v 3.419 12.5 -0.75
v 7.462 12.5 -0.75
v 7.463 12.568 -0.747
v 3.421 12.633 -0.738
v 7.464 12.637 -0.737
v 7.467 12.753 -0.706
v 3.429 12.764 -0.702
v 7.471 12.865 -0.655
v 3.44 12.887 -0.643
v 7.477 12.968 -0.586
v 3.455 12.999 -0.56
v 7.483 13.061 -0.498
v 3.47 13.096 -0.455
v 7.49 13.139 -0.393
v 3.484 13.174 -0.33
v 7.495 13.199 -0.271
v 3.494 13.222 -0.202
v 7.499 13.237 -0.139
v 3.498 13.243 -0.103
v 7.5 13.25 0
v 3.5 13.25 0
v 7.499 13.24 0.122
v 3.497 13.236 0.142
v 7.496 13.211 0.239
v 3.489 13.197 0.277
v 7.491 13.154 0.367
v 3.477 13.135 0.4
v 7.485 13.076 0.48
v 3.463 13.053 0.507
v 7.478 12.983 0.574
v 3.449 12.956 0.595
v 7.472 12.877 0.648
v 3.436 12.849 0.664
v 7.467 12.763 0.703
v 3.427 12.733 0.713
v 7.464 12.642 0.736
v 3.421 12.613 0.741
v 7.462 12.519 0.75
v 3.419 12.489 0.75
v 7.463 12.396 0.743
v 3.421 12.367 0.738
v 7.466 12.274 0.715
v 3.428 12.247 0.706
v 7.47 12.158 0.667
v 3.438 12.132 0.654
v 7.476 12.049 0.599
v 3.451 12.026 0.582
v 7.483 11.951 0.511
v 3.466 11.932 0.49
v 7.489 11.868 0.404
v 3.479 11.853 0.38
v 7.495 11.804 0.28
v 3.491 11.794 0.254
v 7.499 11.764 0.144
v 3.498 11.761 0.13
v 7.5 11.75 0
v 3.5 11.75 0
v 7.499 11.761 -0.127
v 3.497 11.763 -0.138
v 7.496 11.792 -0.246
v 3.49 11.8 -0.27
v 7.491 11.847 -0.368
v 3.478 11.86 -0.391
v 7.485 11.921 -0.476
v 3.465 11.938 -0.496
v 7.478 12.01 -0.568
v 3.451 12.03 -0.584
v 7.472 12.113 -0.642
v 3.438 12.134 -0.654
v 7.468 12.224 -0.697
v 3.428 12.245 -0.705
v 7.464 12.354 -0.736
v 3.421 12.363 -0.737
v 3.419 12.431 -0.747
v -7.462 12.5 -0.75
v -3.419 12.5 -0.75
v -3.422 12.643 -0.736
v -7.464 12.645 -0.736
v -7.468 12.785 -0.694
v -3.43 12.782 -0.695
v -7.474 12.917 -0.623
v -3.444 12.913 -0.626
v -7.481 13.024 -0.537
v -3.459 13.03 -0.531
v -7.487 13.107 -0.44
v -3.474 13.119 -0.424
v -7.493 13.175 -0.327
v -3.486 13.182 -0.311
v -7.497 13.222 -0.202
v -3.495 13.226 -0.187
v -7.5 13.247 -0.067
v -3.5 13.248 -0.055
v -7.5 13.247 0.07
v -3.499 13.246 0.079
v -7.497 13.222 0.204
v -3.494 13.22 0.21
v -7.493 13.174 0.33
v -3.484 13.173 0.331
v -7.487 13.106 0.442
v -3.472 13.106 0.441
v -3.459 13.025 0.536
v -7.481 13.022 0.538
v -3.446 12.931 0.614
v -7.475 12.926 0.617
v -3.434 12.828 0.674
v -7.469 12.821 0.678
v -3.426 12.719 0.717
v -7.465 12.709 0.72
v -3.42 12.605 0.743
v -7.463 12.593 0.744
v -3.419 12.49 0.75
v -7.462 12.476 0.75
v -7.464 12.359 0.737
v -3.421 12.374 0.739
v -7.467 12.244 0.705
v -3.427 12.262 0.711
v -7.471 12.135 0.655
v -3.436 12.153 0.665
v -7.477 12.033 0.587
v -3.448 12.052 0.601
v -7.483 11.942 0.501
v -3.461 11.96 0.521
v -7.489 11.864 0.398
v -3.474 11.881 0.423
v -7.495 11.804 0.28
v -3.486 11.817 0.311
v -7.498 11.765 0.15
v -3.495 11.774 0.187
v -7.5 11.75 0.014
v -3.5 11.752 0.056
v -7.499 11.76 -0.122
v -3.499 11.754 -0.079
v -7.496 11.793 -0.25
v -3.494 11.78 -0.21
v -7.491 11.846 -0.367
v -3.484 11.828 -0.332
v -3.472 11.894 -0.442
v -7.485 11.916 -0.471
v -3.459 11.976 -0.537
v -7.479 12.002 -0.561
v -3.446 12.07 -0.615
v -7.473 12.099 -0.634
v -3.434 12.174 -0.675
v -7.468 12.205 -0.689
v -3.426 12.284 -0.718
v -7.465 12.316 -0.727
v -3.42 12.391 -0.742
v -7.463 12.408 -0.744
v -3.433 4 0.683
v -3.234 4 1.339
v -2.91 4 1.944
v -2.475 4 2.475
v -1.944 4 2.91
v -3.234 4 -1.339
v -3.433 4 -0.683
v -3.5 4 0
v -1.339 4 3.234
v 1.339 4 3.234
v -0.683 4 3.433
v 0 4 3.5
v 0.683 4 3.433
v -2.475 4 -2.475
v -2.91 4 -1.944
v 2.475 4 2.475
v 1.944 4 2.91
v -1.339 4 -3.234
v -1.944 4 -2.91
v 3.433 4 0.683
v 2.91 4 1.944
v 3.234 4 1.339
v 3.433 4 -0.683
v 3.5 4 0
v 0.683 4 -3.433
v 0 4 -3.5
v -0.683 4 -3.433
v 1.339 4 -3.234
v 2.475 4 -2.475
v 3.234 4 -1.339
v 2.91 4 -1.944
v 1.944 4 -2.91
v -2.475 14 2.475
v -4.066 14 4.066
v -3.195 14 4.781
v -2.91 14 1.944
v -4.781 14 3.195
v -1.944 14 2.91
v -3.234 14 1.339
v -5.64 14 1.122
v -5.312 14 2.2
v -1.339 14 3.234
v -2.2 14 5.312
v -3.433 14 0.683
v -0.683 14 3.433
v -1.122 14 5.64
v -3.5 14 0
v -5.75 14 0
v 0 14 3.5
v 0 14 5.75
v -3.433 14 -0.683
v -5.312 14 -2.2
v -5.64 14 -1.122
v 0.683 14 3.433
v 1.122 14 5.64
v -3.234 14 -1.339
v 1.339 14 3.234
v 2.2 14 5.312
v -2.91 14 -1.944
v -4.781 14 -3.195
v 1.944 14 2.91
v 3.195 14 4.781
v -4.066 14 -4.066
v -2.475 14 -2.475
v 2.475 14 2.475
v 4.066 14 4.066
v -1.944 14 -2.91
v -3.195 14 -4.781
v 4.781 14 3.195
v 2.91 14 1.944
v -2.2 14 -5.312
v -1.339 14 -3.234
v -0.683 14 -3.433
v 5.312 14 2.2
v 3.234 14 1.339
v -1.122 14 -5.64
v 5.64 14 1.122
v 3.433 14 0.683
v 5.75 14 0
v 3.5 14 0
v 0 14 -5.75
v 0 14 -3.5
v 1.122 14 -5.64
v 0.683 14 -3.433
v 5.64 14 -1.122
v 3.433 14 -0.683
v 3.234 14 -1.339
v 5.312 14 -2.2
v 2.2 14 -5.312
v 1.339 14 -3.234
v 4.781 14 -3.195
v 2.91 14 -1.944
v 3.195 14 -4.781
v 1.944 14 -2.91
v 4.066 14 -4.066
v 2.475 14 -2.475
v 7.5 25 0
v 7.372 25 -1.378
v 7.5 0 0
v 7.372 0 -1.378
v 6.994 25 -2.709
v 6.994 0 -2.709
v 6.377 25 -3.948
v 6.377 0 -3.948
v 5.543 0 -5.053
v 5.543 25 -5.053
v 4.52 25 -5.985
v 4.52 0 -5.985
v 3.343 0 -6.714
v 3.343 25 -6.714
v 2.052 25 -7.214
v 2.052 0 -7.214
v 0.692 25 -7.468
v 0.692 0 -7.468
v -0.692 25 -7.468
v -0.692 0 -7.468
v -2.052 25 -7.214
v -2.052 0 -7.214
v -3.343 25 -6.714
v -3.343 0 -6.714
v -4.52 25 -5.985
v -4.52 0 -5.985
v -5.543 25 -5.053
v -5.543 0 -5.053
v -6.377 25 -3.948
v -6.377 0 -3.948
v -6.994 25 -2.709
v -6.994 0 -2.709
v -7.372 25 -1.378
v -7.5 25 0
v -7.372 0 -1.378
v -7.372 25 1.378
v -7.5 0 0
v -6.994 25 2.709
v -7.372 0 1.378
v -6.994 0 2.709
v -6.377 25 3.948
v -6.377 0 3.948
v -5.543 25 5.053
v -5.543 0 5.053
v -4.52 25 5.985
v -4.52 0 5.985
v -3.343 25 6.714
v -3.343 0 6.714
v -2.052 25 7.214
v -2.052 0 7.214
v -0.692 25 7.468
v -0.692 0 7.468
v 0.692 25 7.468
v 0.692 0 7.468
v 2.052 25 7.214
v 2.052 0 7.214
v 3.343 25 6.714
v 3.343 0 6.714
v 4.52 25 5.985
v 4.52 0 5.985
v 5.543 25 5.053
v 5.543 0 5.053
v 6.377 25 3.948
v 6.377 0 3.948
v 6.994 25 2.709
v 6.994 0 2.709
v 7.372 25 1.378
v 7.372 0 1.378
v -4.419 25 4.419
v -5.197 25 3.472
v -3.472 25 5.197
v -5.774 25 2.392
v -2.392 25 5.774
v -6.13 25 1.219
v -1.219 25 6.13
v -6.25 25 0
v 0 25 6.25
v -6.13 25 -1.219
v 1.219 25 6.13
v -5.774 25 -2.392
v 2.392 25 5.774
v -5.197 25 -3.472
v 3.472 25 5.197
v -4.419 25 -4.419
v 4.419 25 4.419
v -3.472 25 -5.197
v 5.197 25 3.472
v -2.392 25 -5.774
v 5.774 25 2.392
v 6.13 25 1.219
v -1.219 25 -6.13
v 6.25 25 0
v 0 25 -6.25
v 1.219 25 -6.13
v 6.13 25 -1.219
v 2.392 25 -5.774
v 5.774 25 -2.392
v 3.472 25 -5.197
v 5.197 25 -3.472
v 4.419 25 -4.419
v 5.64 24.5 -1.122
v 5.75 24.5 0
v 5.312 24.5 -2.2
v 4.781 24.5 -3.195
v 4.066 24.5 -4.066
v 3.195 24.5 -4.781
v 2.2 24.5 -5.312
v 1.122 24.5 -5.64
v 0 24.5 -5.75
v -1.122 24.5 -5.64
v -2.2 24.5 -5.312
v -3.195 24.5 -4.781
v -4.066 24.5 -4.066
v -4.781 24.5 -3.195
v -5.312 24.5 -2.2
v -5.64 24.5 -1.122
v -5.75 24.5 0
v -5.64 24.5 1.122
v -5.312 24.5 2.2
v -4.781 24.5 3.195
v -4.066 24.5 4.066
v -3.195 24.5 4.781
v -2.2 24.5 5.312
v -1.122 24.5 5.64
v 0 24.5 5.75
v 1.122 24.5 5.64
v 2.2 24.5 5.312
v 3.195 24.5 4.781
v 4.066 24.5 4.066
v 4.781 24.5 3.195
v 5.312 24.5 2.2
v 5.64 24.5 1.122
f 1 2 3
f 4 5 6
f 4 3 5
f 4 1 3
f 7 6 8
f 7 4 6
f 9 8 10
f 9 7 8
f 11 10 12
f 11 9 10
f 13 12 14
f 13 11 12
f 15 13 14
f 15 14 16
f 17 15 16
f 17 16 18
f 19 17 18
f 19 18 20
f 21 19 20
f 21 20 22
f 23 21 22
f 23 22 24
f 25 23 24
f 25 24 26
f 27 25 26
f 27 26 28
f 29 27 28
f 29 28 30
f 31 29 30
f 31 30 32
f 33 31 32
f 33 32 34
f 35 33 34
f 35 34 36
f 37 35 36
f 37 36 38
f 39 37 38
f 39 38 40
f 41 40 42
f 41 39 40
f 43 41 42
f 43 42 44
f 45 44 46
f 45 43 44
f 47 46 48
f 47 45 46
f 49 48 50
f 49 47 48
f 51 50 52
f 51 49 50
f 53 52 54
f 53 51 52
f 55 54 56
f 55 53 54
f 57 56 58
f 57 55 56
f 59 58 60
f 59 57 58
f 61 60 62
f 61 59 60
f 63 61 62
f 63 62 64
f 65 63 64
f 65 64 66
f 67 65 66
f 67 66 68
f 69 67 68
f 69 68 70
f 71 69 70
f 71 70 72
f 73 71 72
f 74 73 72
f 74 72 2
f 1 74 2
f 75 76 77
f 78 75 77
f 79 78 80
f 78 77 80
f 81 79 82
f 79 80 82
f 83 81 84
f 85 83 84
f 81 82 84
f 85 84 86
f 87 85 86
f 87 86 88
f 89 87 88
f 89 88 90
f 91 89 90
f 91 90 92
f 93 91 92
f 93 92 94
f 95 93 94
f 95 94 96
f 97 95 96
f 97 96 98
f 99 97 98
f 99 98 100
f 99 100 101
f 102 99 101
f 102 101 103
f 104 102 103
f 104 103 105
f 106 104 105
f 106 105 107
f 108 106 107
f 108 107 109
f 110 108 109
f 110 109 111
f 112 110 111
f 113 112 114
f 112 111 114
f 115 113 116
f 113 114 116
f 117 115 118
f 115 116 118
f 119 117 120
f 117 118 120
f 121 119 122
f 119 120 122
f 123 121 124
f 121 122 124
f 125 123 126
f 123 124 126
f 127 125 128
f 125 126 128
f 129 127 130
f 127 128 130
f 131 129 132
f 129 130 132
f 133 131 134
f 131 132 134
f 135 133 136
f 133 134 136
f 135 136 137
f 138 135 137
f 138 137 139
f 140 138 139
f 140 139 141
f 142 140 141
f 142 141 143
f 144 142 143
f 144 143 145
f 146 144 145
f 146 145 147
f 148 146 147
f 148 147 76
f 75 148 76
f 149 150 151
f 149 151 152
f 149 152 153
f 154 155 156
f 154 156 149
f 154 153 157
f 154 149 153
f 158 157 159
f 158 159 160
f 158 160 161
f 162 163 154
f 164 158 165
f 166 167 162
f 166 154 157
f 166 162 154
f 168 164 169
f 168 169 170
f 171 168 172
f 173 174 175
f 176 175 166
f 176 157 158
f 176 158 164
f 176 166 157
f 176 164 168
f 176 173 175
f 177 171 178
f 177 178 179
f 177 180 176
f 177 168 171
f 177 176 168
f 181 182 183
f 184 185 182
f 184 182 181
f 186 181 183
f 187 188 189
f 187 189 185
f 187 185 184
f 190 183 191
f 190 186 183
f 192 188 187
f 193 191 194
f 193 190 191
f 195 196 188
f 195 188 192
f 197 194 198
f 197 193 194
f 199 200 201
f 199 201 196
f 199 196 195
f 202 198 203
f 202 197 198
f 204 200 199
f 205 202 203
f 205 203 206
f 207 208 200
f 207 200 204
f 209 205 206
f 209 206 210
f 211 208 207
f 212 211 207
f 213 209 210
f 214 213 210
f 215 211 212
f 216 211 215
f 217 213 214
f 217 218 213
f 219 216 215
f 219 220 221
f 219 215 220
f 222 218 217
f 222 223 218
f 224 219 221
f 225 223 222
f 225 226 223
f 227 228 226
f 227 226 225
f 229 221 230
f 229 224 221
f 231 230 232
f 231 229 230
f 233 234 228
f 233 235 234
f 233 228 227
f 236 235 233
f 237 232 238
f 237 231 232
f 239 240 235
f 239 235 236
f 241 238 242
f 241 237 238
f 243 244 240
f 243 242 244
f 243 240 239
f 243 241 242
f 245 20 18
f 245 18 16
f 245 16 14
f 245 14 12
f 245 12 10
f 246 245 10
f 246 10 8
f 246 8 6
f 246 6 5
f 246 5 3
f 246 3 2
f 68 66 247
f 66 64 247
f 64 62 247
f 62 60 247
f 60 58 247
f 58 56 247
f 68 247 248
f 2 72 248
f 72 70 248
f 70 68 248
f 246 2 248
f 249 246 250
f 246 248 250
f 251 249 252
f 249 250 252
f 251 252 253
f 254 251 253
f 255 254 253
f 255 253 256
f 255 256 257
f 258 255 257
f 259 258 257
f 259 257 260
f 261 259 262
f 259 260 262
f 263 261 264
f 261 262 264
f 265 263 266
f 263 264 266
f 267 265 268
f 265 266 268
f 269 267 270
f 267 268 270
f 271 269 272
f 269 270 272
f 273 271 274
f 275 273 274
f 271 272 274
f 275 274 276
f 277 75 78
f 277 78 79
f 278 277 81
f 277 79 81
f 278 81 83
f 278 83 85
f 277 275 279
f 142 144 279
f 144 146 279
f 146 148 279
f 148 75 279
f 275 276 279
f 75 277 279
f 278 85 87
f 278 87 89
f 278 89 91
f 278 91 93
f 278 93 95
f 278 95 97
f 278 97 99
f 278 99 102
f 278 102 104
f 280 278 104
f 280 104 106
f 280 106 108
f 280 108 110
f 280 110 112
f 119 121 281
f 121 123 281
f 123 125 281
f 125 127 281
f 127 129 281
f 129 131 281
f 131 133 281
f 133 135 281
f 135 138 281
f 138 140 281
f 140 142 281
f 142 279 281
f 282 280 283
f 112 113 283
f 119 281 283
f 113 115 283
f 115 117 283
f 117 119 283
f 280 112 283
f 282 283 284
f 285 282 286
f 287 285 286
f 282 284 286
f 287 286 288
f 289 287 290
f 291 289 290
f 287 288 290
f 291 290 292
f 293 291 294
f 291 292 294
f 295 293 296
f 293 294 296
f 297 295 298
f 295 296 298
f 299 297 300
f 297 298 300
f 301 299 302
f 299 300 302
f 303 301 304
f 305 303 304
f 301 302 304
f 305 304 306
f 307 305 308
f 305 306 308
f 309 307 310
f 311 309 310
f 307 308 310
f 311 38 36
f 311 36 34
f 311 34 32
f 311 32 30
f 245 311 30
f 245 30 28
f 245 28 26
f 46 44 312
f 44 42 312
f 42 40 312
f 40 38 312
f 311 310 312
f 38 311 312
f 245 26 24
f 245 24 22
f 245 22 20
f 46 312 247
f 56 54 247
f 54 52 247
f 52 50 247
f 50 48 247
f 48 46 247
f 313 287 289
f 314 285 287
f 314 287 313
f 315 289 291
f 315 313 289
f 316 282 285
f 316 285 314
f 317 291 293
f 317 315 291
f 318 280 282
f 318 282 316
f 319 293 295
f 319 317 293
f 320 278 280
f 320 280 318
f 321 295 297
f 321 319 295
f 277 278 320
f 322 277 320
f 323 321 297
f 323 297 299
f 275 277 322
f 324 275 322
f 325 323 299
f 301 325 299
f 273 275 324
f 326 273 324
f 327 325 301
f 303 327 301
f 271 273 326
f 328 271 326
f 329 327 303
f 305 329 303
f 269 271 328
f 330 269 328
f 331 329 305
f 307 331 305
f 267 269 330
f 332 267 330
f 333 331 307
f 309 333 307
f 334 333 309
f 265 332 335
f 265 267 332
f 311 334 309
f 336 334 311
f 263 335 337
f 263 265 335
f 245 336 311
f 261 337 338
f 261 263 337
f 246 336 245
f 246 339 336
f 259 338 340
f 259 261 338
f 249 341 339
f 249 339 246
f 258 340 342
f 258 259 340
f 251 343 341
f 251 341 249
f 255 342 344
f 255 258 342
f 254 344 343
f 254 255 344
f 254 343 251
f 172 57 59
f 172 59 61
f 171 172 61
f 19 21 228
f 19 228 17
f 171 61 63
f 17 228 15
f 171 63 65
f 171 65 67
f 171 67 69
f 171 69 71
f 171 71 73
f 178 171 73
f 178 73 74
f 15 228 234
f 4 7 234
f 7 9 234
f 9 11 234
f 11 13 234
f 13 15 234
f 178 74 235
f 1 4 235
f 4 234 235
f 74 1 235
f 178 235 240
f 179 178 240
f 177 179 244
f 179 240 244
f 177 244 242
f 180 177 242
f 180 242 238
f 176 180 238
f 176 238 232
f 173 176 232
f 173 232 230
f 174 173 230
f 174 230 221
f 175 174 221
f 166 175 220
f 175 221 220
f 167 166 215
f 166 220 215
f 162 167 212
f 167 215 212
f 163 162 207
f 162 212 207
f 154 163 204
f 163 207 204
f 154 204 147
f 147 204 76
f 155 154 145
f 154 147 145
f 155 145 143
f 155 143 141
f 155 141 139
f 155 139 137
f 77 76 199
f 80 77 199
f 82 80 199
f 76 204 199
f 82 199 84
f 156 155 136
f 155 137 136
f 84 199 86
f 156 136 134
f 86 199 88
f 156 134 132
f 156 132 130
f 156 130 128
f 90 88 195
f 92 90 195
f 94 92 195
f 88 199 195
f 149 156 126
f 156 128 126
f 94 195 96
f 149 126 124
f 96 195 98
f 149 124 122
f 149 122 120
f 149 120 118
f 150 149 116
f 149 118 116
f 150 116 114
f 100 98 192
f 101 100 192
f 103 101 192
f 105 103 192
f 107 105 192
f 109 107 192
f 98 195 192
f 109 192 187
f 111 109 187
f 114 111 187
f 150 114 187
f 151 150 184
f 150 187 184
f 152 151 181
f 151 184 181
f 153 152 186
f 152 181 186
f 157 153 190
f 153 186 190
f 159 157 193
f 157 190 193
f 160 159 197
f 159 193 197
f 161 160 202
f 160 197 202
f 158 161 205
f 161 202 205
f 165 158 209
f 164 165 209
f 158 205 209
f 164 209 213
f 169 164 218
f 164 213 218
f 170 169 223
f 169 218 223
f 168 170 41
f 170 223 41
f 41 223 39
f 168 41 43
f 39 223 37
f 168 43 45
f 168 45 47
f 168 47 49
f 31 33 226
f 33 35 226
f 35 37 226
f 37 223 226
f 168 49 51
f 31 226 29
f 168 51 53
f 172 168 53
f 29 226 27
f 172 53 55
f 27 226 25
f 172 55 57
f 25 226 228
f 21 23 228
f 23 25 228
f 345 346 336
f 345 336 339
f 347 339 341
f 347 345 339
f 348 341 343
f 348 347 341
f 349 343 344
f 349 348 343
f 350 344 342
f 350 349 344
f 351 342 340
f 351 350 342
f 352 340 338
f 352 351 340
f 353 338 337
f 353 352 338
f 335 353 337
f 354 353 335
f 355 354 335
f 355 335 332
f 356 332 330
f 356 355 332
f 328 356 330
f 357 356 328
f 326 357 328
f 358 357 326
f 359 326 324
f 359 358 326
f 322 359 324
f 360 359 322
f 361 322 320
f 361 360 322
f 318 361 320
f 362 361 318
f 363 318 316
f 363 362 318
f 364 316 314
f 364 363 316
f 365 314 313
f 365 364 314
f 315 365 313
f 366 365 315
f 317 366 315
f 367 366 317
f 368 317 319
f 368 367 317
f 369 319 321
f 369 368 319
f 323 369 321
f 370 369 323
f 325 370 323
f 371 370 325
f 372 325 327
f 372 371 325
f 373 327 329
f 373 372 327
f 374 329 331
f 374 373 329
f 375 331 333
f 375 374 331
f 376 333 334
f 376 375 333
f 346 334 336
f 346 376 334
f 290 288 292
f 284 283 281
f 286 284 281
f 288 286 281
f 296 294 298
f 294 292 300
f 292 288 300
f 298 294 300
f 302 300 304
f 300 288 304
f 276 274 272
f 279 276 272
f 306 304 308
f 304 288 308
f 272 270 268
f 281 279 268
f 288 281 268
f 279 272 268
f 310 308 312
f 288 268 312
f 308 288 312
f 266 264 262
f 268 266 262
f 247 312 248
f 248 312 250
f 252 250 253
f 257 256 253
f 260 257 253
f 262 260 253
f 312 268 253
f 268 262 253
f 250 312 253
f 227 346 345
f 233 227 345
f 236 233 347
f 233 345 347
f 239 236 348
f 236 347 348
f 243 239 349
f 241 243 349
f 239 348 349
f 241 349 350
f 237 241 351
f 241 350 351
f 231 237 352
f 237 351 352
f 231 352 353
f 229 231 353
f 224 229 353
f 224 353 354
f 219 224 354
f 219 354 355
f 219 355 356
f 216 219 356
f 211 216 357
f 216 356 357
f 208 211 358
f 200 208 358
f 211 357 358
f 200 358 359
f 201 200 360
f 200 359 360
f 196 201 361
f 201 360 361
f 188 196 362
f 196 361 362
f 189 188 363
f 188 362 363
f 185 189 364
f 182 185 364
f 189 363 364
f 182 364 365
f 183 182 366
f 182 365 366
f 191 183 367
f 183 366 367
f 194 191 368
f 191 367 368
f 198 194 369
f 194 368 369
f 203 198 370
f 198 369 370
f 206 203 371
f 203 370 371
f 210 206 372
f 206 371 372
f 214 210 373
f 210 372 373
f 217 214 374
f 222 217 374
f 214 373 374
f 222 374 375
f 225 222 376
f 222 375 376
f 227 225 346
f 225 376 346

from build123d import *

# Parameters (mm, degrees)
SKETCH1_R                      = 7.5
BOSS_EXTRUDE1_DEPTH            = 25
SKETCH2_R                      = 5.75
CUT_EXTRUDE1_DEPTH             = 11
CHAMFER1_SIZE                  = 0.5
SKETCH3_R                      = 3.5
CUT_EXTRUDE2_DEPTH             = 10
CUT_EXTRUDE3_REACH             = 9.5
SKETCH4_R                      = 0.75
CUT_EXTRUDE3_DIRECTION_2_REACH = 9.5


with BuildPart() as part:
    # Sketch1 → Boss-Extrude1 (new body)
    with BuildSketch(Plane(origin=(0, 0, 0), x_dir=(1, 0, 0), z_dir=(0, 1, 0))):
        Circle(SKETCH1_R)
    extrude(amount=BOSS_EXTRUDE1_DEPTH)

    # Sketch2 → Cut-Extrude1 (cut)
    with BuildSketch(Plane(origin=(0, 25, 0), x_dir=(1, 0, 0), z_dir=(0, 1, 0))):
        Circle(SKETCH2_R)
    extrude(amount=-CUT_EXTRUDE1_DEPTH, mode=Mode.SUBTRACT)

    # Chamfer1
    chamfer1_edges = [part.edges().sort_by_distance(p)[0] for p in [
        (-5.75, 25, 0),
    ]]
    chamfer(chamfer1_edges, length=CHAMFER1_SIZE)

    # Sketch3 → Cut-Extrude2 (cut)
    with BuildSketch(Plane(origin=(0, 14, 0), x_dir=(1, 0, 0), z_dir=(0, 1, 0))):
        Circle(SKETCH3_R)
    extrude(amount=-CUT_EXTRUDE2_DEPTH, mode=Mode.SUBTRACT)

    # Sketch4 → Cut-Extrude3 (cut, up to next)
    with BuildSketch(Plane(origin=(0, 0, 0), x_dir=(0, 0, -1), z_dir=(1, 0, 0)), mode=Mode.PRIVATE) as cut_extrude3_sk1:
        with Locations((0, 12.5)):
            Circle(SKETCH4_R)
    cut_extrude3_tool1 = extrude(cut_extrude3_sk1.sketch, amount=-CUT_EXTRUDE3_REACH, mode=Mode.PRIVATE) & part.part
    add(cut_extrude3_tool1.solids().sort_by_distance((0, 12.5, 0))[0], mode=Mode.SUBTRACT)

    # Sketch4 → Cut-Extrude3 direction 2 (cut, up to next)
    with BuildSketch(Plane(origin=(0, 0, 0), x_dir=(0, 0, -1), z_dir=(1, 0, 0)), mode=Mode.PRIVATE) as cut_extrude3_direction_2_sk1:
        with Locations((0, 12.5)):
            Circle(SKETCH4_R)
    cut_extrude3_direction_2_tool1 = extrude(cut_extrude3_direction_2_sk1.sketch, amount=CUT_EXTRUDE3_DIRECTION_2_REACH, mode=Mode.PRIVATE) & part.part
    add(cut_extrude3_direction_2_tool1.solids().sort_by_distance((0, 12.5, 0))[0], mode=Mode.SUBTRACT)


solid = part.part
